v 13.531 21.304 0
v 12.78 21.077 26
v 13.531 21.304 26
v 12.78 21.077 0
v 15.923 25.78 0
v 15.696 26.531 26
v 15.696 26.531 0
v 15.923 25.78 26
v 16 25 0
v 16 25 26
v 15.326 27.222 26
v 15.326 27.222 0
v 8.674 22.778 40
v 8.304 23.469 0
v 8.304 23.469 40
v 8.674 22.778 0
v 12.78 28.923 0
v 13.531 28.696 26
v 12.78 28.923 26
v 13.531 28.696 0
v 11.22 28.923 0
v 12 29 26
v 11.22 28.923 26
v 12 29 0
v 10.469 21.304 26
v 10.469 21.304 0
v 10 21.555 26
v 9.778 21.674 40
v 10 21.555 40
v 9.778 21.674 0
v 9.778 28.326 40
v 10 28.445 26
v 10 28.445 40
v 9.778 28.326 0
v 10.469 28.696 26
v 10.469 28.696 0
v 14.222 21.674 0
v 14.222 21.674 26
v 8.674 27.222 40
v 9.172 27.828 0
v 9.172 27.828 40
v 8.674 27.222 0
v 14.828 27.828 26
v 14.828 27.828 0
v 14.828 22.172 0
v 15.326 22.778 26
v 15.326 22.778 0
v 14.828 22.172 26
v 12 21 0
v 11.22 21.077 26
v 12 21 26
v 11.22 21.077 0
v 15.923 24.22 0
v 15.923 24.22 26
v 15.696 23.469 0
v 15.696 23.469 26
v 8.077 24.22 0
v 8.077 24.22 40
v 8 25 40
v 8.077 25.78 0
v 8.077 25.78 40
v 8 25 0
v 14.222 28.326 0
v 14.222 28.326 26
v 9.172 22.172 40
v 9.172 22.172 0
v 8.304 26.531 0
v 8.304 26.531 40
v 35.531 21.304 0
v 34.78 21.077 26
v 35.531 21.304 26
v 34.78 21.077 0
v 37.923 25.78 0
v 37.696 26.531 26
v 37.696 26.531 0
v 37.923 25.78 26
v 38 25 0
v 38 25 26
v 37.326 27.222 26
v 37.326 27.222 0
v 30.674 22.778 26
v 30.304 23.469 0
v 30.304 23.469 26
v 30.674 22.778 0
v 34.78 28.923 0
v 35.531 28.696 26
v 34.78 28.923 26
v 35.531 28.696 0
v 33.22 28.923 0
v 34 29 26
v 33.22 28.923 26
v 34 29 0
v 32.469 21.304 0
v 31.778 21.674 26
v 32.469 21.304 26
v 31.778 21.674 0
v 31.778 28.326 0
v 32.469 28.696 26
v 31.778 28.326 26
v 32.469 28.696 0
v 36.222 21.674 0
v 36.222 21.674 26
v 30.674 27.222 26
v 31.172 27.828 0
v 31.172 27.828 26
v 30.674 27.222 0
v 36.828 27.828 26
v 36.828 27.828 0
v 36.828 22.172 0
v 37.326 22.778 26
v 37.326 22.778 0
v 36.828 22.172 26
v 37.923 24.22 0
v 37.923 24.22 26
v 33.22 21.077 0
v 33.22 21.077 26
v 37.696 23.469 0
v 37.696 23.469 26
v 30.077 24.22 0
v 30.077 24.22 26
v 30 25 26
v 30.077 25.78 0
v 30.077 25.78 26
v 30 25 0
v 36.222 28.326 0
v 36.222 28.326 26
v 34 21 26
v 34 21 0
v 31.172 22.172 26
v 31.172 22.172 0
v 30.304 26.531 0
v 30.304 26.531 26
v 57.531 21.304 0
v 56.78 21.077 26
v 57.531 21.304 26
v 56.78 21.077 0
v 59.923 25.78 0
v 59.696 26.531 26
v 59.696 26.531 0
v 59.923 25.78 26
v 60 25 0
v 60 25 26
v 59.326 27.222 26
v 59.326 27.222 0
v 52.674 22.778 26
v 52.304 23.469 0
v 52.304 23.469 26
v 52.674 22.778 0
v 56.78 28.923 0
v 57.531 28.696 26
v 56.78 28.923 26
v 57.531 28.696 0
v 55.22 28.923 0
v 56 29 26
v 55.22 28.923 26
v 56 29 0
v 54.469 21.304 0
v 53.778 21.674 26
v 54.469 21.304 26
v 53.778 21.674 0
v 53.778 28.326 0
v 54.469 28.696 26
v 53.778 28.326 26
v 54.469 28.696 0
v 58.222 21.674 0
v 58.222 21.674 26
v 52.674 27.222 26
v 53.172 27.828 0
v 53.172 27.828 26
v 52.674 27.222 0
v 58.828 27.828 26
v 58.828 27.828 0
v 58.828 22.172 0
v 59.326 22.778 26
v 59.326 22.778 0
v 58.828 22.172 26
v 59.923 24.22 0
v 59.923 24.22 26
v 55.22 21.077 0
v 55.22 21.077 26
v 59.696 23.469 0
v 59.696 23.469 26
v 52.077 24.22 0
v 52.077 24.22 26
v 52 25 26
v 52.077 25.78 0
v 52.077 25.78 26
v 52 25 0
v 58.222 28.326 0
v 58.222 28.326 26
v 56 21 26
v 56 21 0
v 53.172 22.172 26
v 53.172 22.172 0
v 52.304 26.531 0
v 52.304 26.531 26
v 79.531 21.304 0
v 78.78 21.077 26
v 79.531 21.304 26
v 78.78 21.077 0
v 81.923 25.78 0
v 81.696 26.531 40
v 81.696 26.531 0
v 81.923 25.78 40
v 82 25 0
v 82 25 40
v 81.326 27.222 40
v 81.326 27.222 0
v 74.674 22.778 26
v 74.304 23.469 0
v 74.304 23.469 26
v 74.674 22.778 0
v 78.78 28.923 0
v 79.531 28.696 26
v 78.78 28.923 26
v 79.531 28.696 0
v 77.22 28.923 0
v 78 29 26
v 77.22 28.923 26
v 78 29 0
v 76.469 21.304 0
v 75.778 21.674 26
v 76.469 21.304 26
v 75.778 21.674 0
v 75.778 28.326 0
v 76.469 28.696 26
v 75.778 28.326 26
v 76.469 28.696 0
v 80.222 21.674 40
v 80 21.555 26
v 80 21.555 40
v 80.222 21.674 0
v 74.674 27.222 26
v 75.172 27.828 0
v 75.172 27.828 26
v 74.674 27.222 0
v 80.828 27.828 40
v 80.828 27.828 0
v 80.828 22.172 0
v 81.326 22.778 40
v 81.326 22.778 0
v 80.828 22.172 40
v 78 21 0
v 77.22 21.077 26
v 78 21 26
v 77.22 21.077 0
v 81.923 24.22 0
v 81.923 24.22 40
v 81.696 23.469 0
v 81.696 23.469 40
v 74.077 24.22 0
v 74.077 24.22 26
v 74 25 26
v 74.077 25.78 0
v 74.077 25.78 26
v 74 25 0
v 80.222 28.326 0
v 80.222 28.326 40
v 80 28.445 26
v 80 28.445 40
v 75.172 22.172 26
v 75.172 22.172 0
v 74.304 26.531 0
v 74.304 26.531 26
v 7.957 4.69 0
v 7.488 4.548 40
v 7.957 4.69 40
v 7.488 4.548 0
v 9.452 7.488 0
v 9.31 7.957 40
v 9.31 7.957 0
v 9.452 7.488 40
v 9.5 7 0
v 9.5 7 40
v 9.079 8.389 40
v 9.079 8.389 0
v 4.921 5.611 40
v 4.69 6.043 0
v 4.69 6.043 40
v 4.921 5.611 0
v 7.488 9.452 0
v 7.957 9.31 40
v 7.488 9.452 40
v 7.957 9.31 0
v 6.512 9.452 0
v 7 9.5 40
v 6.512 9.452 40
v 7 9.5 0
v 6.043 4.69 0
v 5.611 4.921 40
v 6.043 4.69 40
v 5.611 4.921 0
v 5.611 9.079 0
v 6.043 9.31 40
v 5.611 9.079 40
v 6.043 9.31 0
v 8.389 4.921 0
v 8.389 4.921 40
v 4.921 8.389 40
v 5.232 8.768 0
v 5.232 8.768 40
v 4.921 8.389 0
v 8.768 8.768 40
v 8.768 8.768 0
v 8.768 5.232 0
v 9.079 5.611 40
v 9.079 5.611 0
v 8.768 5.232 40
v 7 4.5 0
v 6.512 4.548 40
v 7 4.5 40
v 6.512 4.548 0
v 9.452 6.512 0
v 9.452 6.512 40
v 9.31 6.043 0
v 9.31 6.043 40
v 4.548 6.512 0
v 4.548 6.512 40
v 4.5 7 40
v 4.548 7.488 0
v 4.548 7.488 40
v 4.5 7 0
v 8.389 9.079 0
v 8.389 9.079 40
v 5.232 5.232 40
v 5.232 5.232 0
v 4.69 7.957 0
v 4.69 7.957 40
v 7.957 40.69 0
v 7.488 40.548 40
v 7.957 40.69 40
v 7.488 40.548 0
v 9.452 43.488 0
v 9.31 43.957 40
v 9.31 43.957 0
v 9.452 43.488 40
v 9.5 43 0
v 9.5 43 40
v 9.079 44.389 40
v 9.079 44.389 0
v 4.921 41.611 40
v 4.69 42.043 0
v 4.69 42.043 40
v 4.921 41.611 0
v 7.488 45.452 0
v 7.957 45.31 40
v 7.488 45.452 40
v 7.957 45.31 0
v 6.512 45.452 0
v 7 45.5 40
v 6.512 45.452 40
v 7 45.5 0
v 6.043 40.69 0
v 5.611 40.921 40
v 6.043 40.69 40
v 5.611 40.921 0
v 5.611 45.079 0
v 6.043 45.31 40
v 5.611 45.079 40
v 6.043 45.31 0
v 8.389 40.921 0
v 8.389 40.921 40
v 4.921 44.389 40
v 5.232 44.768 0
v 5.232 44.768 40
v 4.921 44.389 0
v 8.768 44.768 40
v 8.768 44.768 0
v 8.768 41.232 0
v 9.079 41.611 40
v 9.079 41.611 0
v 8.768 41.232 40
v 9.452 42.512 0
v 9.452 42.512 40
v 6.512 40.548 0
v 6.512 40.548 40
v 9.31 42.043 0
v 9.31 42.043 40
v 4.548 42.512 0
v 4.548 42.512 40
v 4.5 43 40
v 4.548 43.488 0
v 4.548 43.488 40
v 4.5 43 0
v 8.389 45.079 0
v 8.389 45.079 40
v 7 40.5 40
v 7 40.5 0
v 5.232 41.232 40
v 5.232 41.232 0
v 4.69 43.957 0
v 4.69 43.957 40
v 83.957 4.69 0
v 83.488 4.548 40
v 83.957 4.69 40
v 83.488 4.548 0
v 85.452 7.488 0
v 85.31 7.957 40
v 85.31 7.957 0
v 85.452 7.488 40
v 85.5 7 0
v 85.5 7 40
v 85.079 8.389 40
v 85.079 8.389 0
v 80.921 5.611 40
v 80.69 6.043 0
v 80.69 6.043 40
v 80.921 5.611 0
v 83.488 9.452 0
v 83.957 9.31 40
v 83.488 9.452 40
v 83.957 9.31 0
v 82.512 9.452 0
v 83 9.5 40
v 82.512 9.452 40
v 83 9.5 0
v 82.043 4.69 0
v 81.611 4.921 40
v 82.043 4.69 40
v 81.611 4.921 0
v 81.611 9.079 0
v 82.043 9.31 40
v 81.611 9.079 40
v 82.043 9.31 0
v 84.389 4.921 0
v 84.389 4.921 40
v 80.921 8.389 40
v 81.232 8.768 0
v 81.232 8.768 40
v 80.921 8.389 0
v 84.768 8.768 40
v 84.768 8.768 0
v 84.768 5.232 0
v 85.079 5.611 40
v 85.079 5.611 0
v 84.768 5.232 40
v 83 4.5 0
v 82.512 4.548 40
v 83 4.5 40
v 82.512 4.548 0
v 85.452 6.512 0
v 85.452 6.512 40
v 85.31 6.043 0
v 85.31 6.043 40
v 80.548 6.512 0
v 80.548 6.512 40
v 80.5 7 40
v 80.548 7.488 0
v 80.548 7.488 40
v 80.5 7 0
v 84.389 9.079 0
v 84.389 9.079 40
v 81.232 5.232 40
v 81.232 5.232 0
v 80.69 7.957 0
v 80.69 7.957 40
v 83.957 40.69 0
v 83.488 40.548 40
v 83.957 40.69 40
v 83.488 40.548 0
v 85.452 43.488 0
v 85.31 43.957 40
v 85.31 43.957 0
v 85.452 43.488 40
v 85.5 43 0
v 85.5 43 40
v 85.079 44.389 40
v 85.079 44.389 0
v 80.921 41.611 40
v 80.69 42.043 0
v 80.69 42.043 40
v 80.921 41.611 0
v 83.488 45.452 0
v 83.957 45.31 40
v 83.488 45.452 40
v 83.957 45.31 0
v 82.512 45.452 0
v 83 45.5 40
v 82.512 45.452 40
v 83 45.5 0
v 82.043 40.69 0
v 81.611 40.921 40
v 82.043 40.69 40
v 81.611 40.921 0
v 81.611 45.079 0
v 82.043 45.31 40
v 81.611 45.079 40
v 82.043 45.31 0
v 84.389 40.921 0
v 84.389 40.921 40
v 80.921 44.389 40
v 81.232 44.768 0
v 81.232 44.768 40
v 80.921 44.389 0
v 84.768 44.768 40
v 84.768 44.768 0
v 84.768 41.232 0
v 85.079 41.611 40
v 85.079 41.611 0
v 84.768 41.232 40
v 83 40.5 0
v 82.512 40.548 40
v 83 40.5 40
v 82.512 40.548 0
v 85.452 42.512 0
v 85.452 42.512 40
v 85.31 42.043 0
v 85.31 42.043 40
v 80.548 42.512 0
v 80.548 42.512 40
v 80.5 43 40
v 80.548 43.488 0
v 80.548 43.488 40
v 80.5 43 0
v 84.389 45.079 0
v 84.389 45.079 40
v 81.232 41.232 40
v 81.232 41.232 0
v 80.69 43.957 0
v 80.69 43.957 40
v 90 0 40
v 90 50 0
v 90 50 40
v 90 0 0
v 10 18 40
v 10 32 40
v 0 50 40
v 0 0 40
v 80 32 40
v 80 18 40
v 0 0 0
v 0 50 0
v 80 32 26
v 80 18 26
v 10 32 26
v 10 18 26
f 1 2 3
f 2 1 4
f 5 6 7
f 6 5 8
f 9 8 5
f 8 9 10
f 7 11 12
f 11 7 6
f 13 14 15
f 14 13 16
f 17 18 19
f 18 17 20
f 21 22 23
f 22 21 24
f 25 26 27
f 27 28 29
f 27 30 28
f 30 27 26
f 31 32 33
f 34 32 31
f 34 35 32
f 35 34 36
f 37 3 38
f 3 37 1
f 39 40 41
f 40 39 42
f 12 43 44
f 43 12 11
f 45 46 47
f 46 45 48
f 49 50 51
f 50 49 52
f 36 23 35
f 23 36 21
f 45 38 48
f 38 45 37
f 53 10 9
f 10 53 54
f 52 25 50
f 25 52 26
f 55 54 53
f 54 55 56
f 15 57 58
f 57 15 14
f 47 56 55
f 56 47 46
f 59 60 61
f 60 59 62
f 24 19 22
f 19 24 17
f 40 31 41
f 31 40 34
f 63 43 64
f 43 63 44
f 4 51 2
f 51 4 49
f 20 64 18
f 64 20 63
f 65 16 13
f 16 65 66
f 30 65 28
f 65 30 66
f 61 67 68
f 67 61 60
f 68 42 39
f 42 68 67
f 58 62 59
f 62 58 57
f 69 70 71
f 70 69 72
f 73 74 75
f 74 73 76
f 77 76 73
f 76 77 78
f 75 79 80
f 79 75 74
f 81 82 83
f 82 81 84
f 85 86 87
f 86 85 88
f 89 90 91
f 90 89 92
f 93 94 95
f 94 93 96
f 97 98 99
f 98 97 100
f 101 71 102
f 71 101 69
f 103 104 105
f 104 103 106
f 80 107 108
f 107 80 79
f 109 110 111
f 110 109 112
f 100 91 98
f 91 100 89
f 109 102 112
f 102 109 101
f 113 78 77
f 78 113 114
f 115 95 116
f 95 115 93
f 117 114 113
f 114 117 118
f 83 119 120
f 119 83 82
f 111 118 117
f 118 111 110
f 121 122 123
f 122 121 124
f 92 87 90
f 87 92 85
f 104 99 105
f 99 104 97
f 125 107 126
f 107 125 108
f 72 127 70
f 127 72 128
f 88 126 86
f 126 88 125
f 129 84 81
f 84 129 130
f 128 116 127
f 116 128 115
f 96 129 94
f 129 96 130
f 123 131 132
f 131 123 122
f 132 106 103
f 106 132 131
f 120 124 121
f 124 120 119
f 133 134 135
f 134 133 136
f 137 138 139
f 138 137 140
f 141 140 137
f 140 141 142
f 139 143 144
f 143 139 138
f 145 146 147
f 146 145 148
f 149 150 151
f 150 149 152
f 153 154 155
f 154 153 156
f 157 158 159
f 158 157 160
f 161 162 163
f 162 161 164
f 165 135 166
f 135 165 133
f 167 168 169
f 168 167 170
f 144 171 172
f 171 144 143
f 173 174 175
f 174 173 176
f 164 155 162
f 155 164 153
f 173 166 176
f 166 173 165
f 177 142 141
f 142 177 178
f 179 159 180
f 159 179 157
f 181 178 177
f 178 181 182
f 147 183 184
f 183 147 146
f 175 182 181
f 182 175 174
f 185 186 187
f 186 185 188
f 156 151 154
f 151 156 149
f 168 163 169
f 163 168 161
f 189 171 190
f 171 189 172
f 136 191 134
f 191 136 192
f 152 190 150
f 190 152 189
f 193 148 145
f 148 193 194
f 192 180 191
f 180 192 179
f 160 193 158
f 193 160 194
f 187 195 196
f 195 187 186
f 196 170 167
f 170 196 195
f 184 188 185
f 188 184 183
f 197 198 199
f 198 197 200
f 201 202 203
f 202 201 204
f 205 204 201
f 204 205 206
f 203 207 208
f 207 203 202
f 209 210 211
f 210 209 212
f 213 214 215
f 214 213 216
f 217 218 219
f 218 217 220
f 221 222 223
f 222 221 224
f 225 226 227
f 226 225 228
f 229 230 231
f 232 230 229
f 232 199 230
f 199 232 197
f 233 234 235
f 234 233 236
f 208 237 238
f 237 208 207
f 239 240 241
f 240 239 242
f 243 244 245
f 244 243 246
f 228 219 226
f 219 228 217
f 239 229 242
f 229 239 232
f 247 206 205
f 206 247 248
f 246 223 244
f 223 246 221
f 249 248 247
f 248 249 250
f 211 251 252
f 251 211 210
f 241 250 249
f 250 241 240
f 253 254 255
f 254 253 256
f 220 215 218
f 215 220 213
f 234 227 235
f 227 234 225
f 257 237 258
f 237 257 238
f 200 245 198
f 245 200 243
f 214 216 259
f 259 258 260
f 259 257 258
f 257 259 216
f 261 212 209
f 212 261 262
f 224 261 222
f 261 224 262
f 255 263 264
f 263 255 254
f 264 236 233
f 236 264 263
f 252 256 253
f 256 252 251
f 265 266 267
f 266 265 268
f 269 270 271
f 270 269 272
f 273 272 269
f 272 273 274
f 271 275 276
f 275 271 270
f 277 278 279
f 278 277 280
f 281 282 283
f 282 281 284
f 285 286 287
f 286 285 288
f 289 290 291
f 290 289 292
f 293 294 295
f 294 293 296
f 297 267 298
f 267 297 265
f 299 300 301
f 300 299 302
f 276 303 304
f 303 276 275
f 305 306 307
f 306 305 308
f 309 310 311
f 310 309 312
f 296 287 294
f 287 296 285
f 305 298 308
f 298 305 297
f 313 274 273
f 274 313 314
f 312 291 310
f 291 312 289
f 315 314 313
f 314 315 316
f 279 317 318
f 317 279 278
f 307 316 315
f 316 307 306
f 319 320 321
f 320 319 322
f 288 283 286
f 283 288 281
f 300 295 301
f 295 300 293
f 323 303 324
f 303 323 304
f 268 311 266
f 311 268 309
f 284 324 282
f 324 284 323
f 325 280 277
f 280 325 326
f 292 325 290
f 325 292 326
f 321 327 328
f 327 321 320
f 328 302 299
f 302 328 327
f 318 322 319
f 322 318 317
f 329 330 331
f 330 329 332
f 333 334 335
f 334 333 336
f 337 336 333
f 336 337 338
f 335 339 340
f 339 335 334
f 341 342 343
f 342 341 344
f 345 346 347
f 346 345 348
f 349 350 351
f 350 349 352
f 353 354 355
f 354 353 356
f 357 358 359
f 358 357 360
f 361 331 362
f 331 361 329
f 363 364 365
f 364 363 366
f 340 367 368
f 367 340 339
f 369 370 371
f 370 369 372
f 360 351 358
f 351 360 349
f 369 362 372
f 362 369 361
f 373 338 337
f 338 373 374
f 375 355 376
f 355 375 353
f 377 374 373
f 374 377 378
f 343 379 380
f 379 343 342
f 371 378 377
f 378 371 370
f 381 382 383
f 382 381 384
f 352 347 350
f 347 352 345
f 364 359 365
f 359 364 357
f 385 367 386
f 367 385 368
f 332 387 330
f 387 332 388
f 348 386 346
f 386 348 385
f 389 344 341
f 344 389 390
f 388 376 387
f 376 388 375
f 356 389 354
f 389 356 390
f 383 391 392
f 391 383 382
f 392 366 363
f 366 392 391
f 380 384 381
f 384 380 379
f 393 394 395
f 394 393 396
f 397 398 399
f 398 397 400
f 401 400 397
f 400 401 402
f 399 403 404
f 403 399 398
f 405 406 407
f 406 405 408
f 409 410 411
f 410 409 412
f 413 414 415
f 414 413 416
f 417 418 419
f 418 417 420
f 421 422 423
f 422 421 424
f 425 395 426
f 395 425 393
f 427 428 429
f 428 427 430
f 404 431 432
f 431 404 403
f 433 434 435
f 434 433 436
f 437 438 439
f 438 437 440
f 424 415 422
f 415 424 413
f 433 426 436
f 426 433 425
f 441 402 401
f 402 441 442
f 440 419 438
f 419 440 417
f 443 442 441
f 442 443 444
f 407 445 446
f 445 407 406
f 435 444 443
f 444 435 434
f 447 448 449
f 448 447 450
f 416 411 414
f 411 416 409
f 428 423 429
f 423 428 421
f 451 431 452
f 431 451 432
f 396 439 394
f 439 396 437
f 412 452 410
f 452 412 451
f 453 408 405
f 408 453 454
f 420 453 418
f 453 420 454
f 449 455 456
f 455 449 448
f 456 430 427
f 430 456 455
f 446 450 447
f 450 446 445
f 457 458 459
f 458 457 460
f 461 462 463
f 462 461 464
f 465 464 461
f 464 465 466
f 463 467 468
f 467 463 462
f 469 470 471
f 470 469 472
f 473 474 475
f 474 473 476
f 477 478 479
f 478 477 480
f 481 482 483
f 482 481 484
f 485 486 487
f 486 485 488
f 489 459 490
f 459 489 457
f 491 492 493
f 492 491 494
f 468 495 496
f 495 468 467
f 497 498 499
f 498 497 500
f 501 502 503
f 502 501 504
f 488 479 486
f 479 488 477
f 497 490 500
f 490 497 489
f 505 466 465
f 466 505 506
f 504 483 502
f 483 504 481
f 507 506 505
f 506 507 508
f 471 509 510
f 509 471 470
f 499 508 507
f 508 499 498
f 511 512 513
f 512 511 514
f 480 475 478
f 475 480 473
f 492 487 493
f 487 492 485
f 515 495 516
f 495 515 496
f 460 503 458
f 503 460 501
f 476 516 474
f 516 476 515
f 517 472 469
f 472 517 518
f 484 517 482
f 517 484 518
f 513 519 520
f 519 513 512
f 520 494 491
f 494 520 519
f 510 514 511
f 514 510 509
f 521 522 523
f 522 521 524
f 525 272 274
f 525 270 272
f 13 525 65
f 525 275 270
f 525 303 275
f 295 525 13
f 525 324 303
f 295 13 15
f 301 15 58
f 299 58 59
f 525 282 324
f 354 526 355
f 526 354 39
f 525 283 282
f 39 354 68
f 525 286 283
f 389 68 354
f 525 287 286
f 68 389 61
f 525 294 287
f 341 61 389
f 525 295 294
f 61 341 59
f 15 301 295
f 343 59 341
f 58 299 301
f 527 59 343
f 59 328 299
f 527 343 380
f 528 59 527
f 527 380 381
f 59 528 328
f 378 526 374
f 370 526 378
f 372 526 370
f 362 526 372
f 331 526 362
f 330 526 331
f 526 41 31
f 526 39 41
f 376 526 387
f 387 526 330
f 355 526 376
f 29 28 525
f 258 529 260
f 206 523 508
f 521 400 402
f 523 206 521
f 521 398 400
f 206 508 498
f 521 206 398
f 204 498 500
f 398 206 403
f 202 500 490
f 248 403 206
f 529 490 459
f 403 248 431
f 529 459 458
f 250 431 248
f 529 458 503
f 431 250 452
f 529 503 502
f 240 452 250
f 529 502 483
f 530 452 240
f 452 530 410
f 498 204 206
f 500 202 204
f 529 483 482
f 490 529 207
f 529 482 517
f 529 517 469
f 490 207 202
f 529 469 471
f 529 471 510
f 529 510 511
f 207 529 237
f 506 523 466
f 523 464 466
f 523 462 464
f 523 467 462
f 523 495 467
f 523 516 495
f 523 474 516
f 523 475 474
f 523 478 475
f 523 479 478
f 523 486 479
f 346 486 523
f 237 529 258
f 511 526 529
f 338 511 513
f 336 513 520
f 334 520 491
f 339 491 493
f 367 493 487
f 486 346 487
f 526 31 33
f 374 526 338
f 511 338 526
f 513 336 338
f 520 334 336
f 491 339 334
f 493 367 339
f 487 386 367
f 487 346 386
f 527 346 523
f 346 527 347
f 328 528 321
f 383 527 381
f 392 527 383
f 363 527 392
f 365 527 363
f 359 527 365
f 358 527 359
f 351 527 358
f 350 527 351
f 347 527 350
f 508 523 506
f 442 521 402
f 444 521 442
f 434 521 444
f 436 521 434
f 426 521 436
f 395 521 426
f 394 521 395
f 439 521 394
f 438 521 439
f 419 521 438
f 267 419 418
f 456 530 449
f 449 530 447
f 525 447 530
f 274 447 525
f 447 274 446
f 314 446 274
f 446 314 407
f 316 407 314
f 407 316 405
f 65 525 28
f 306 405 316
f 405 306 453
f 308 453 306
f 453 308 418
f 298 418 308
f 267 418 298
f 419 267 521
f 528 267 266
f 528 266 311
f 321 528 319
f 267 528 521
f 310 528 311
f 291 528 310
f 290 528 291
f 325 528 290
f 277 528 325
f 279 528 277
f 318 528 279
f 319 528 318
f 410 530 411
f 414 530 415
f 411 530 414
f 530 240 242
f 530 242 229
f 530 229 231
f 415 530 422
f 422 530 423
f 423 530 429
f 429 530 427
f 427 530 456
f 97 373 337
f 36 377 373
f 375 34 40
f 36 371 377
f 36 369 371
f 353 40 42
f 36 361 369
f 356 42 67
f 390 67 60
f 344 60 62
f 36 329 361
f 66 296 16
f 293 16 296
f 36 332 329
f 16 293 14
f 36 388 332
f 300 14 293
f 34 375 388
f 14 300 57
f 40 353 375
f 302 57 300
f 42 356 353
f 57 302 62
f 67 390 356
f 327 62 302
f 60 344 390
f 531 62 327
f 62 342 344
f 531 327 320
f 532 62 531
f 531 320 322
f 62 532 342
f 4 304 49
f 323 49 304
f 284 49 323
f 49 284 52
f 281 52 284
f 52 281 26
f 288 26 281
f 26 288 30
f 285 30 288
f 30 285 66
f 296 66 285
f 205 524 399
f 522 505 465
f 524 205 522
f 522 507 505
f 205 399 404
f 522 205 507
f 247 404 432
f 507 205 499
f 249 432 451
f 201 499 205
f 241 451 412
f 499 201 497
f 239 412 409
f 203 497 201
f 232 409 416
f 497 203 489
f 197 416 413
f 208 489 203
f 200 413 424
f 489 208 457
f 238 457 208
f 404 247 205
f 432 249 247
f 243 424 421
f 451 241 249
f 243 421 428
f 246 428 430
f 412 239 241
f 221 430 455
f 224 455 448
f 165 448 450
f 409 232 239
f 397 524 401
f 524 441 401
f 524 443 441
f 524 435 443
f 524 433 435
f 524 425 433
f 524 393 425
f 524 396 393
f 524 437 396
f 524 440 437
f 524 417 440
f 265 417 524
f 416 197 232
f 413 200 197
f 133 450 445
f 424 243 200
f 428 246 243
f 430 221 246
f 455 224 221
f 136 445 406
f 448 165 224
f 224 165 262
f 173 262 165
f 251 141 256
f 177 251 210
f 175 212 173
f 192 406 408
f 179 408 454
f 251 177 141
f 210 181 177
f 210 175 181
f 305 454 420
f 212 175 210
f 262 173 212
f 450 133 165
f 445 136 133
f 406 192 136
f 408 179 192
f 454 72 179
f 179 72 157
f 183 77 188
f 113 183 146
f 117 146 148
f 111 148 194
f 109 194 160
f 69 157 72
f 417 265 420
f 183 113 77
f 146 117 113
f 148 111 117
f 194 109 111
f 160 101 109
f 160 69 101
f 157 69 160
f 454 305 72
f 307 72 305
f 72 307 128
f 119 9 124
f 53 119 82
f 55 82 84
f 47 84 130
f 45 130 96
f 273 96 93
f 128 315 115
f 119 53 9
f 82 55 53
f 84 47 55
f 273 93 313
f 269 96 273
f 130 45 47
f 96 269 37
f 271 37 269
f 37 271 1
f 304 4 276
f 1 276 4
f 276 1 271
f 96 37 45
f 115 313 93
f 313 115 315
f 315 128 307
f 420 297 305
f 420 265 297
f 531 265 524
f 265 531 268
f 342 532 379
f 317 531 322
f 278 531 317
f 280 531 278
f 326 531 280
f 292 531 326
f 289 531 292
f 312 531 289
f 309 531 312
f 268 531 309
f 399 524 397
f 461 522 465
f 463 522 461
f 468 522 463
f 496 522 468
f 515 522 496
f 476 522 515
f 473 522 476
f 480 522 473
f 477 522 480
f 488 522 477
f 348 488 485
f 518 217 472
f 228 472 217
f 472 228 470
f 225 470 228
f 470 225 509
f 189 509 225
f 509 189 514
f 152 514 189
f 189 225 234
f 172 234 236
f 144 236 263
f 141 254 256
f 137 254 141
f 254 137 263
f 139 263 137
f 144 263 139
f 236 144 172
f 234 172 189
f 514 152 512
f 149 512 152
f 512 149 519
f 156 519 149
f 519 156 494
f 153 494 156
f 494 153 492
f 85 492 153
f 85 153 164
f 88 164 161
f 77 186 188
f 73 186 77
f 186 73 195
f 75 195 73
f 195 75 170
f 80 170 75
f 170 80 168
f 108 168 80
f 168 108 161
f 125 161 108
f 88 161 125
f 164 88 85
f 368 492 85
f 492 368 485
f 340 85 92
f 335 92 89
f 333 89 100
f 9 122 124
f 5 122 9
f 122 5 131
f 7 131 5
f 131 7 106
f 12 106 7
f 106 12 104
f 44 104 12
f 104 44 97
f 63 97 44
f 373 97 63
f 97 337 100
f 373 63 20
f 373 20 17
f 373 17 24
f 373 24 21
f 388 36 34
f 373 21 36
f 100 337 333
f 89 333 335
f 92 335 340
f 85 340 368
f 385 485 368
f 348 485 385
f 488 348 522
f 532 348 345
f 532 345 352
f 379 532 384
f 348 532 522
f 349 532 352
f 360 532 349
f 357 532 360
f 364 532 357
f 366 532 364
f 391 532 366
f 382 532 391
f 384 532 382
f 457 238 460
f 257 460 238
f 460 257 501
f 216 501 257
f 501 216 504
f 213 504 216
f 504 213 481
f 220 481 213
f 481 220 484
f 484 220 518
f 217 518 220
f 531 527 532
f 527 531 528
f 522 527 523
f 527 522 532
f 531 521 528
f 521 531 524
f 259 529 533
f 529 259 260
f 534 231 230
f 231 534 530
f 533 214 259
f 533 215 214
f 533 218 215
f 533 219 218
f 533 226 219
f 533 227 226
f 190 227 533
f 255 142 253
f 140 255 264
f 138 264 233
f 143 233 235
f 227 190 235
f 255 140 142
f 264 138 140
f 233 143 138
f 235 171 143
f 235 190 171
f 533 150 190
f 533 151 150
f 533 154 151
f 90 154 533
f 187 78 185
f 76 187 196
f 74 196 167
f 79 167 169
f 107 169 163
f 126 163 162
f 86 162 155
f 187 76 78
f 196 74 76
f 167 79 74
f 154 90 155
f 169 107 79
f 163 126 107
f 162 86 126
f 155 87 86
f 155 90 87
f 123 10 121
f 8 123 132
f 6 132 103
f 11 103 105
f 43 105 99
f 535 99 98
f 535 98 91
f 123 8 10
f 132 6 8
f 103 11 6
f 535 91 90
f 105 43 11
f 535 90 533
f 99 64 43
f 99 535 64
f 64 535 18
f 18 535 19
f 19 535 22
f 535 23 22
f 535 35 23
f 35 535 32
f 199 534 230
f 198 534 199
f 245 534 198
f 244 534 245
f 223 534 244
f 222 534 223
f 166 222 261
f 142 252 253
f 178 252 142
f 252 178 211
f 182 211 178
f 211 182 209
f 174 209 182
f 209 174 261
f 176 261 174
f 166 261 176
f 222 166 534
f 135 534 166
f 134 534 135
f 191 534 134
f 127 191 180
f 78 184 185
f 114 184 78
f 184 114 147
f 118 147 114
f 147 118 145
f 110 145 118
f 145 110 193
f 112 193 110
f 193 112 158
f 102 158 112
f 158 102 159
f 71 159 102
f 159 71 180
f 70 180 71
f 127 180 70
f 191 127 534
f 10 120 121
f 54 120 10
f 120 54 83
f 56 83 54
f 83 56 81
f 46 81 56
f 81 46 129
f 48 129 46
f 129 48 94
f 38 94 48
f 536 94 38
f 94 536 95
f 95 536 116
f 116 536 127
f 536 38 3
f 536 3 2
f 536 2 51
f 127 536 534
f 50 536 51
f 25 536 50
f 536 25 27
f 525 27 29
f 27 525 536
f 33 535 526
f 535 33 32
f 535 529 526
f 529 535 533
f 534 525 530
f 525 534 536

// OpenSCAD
$fn = 32;

// ----------------------------------------------------------------------
// Manifold block: gallery_top manifold
// ----------------------------------------------------------------------

// --- parameters (mm) ---
block_l = 90;             // block length, X
block_w = 50;             // block width, Y
block_h = 40;             // block height, Z
port_d = 8;               // port bore diameter
port_pitch = 22;          // port pitch along X
gallery_d = 14;           // top gallery width, Y
gallery_depth = 14;       // gallery pocket depth
wall_p = 10;              // gallery end wall thickness, X
mnt_d = 5;                // mounting hole diameter
mnt_in = 7;               // mounting hole inset from the edges

n_ports = 4;  // ports in the row
port_x0 = (block_l - (n_ports - 1) * port_pitch) / 2;  // first port X

difference() {
  cube([block_l, block_w, block_h]);
  for (i = [0 : n_ports - 1])
    translate([port_x0 + i * port_pitch, block_w / 2, -1])
      cylinder(h = block_h + 2, d = port_d);
  translate([wall_p, block_w / 2 - gallery_d / 2, block_h - gallery_depth])
    cube([block_l - 2 * wall_p, gallery_d, gallery_depth + 1]);
  for (cx = [mnt_in, block_l - mnt_in])
    for (cy = [mnt_in, block_w - mnt_in])
      translate([cx, cy, -1]) cylinder(h = block_h + 2, d = mnt_d);
}
